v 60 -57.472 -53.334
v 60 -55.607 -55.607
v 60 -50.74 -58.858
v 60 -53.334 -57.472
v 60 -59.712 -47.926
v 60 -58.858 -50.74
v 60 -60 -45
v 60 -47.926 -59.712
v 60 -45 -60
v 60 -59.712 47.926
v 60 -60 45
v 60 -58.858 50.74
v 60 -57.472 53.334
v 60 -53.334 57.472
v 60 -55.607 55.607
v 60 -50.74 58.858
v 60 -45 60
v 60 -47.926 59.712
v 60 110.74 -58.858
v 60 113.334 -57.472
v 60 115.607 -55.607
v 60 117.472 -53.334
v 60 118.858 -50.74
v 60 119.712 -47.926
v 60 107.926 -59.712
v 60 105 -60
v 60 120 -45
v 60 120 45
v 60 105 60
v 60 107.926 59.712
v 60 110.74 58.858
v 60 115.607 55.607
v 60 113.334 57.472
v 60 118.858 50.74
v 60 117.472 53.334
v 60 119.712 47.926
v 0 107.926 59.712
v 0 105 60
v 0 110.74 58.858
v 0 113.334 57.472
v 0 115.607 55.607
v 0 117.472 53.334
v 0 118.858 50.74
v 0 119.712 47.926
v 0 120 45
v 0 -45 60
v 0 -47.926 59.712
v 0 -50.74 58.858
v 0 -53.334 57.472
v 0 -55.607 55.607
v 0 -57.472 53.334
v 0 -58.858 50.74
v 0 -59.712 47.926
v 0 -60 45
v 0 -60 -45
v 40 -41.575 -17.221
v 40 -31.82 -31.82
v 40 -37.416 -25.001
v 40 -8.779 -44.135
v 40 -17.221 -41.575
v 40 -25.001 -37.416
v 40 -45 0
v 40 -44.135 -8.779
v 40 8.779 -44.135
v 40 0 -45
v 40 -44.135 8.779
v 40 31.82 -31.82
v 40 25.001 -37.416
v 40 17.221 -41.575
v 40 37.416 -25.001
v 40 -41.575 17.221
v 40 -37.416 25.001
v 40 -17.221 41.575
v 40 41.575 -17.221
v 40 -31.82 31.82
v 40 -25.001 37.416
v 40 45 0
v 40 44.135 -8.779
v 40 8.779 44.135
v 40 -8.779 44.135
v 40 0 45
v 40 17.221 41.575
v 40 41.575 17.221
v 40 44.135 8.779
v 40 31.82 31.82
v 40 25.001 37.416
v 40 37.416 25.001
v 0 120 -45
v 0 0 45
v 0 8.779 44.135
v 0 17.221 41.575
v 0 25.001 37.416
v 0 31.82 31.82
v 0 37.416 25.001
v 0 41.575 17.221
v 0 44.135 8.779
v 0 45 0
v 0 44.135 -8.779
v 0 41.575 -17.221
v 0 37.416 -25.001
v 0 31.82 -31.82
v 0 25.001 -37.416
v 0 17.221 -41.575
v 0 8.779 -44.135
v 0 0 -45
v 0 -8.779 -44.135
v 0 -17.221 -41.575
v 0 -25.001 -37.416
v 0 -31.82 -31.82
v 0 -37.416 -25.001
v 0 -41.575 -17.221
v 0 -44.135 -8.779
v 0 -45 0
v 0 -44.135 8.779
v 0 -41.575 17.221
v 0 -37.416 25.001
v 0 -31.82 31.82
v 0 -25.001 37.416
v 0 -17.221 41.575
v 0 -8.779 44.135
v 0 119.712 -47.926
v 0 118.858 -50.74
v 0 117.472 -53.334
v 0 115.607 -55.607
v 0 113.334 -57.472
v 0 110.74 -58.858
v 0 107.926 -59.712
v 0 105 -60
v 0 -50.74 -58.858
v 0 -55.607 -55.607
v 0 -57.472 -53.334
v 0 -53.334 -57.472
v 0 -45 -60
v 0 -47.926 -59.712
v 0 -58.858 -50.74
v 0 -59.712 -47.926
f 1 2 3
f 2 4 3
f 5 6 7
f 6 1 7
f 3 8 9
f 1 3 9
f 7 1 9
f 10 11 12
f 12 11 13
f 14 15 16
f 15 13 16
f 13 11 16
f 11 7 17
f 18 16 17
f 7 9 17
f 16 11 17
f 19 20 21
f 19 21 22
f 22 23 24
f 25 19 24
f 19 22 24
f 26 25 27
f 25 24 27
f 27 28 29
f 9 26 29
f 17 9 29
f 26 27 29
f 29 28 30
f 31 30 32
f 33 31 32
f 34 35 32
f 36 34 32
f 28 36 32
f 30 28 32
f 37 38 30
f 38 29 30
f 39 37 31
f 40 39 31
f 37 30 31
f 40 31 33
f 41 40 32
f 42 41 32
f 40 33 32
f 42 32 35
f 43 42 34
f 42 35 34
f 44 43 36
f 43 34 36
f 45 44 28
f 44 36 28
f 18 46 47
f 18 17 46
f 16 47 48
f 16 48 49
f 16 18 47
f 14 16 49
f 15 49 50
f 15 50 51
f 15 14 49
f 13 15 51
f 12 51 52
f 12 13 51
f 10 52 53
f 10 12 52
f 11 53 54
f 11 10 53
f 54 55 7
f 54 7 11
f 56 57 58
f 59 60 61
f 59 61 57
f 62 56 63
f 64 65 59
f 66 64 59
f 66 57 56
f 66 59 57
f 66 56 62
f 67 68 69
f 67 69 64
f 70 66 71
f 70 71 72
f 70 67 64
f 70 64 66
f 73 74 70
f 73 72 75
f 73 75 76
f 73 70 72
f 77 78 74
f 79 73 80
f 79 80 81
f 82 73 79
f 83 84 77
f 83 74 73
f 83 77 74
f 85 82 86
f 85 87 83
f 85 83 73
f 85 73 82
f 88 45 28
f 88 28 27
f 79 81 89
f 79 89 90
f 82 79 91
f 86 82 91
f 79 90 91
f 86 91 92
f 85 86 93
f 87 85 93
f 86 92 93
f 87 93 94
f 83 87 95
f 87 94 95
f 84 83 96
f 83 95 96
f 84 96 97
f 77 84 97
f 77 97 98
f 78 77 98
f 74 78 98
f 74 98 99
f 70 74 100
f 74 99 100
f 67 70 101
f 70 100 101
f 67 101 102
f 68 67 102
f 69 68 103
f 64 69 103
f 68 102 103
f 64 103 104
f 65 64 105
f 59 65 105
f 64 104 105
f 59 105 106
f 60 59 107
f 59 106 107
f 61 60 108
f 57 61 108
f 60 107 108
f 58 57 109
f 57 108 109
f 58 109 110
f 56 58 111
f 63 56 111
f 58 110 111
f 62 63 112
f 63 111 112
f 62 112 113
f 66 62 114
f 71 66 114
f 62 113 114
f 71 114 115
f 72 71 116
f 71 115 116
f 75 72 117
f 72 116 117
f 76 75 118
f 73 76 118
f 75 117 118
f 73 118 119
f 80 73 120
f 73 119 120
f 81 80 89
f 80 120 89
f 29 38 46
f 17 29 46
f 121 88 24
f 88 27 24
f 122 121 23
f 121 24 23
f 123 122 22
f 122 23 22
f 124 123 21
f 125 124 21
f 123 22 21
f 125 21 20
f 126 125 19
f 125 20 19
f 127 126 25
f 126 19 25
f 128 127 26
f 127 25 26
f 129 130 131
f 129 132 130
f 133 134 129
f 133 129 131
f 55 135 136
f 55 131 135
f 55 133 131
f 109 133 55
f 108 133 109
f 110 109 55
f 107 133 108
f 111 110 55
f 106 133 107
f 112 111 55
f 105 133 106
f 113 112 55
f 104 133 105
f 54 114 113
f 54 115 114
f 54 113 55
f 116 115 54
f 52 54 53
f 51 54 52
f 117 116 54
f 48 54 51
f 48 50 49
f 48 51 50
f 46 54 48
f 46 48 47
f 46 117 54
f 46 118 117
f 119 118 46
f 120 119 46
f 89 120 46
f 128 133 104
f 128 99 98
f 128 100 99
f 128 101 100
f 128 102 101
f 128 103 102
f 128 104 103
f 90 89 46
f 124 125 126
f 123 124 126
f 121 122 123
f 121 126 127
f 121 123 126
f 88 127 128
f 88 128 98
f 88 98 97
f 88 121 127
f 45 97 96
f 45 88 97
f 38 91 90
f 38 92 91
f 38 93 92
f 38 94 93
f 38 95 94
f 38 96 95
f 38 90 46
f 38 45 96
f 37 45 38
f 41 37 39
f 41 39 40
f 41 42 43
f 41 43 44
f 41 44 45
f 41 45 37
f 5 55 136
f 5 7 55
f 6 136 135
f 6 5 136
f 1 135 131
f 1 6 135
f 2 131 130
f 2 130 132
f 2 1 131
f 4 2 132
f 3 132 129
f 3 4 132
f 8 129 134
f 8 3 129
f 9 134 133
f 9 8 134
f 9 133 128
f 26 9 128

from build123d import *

# Parameters (mm, degrees)
BOSS_EXTRUDE1_DEPTH = 60
SKETCH3_R           = 45
CUT_EXTRUDE1_DEPTH  = 40
FILLET1_R           = 15


with BuildPart() as part:
    # Sketch2 → Boss-Extrude1 (new body)
    with BuildSketch(Plane(origin=(0, 0, 0), x_dir=(0, 0, -1), z_dir=(1, 0, 0))):
        Polygon((-60, 60), (-60, 120), (60, 120), (60, 60), (60, -60), (-60, -60), align=None)
    extrude(amount=BOSS_EXTRUDE1_DEPTH)

    # Sketch3 → Cut-Extrude1 (cut)
    with BuildSketch(Plane.ZY):
        Circle(SKETCH3_R)
    extrude(amount=-CUT_EXTRUDE1_DEPTH, mode=Mode.SUBTRACT)

    # Fillet1
    fillet1_edges = [part.edges().sort_by_distance(p)[0] for p in [
        (30, 120, 60),
        (30, 120, -60),
        (30, -60, -60),
        (30, -60, 60),
    ]]
    fillet(fillet1_edges, radius=FILLET1_R)


solid = part.part
